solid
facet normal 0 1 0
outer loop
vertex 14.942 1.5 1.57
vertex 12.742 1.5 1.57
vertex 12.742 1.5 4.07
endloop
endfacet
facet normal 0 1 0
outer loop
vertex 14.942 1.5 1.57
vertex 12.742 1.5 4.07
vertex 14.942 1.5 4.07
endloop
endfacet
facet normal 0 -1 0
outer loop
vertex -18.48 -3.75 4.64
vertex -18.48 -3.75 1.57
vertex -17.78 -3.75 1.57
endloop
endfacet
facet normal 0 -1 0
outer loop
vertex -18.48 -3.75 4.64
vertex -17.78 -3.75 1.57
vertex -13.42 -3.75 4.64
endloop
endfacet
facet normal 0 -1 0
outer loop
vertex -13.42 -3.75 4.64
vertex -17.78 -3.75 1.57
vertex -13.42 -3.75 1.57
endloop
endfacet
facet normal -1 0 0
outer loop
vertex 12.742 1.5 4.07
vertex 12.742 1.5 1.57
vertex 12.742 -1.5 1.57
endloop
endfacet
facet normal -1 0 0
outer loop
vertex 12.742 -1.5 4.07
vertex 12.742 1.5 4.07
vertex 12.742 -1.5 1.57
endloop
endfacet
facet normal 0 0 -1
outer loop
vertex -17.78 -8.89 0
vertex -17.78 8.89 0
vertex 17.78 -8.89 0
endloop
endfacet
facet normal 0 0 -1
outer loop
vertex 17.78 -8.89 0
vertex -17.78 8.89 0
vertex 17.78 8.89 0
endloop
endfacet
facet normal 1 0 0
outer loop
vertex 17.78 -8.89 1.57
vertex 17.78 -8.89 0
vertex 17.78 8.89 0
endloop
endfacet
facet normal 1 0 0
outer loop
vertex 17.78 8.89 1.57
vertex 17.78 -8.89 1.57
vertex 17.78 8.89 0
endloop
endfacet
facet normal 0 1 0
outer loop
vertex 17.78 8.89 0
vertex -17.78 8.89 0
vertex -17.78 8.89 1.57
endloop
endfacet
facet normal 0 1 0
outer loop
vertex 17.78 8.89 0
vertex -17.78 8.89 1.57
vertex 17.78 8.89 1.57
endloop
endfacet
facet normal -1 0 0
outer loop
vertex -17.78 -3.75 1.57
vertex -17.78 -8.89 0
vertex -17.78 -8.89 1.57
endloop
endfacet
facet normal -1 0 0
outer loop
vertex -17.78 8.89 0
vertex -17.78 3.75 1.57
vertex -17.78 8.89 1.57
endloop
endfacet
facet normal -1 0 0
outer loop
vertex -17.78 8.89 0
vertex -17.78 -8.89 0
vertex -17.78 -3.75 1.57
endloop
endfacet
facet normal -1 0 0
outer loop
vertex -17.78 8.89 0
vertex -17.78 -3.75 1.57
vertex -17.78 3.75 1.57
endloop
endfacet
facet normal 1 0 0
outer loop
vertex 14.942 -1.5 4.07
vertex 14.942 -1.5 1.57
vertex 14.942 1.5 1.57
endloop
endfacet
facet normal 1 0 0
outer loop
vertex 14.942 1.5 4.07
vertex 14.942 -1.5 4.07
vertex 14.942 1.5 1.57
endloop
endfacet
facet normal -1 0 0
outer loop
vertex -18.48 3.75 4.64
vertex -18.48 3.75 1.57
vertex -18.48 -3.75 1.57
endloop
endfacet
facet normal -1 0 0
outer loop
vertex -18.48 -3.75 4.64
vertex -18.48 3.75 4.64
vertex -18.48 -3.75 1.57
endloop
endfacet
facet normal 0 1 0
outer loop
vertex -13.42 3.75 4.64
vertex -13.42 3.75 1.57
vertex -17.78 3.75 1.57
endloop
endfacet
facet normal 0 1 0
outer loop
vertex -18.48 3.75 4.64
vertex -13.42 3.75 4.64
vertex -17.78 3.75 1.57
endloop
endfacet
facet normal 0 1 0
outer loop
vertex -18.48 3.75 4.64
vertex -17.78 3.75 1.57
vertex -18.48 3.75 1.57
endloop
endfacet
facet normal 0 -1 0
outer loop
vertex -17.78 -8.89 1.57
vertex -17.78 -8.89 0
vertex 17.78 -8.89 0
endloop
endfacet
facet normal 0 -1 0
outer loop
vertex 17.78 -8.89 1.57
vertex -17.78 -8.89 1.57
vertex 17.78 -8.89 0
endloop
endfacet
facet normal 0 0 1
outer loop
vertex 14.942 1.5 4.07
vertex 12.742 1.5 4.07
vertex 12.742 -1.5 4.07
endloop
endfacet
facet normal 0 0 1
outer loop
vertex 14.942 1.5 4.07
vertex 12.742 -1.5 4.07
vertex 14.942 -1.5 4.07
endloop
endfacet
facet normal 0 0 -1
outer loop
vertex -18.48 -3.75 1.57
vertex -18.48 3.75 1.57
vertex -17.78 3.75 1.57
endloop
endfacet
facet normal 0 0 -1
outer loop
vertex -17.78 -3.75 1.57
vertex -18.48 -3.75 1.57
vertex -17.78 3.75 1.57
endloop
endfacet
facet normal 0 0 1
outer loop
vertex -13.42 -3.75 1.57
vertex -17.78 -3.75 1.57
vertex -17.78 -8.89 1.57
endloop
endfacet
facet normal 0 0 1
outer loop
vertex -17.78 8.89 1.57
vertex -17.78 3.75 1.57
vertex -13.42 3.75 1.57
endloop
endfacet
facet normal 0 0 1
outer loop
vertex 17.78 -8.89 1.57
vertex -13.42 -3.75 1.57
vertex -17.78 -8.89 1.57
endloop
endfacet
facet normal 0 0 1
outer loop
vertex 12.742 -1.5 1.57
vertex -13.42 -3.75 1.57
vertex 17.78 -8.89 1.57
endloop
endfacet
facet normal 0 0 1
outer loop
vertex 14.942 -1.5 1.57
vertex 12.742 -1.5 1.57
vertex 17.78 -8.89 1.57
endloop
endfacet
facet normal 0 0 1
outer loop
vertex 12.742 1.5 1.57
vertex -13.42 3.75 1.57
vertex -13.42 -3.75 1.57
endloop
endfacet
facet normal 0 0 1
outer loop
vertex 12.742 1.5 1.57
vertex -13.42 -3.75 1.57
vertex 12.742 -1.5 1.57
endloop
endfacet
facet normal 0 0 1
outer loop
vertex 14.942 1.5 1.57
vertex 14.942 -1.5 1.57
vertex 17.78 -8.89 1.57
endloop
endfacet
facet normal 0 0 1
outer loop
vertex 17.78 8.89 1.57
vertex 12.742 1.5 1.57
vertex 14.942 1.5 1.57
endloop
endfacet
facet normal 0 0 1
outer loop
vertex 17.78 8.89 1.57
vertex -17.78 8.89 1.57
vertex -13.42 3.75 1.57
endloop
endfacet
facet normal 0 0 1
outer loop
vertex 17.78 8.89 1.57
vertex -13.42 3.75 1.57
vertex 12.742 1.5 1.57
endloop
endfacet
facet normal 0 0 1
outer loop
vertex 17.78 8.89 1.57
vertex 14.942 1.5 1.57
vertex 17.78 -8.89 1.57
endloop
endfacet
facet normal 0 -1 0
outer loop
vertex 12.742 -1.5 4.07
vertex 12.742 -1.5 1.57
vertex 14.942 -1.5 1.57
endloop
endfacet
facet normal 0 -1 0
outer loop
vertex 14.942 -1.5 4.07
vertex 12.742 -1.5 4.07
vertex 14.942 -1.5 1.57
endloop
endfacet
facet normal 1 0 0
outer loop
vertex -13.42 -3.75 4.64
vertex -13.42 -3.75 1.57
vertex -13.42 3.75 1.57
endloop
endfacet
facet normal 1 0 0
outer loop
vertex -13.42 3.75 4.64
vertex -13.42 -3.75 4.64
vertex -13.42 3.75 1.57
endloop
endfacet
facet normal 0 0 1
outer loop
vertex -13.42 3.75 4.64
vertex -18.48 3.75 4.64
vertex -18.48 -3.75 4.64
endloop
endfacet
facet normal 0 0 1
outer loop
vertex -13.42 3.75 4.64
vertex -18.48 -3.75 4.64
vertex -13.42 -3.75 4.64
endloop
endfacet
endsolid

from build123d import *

# Parameters (mm, degrees)
F0_W     = 35.56
F0_H     = 17.78
F1_DEPTH = 1.57
F2_W     = 4.36
F2_H     = 3.75
F3_DEPTH = 3.07
F2_W_2   = 2.2
F2_H_2   = 1.5
F4_DEPTH = 2.5


with BuildPart() as f1:
    # F0 (on Top) → F1 (new body)
    with BuildSketch(Plane.XY):
        Rectangle(F0_W, F0_H)
    extrude(amount=F1_DEPTH)

    # F2 (on face) → F3 (join)
    with BuildSketch(Plane.XY.offset(1.57)):
        with Locations((-15.6, 1.875)):
            Rectangle(F2_W, F2_H)
        Polygon((-17.78, -3.75), (-17.78, 0), (-17.78, 3.75), (-18.48, 3.75), (-18.48, -3.75), align=None)
        with Locations((-15.6, -1.875)):
            Rectangle(F2_W, F2_H)
    extrude(amount=F3_DEPTH)

    # F2 (on face) → F4 (join)
    with BuildSketch(Plane.XY.offset(1.57)):
        with Locations((13.841648, 0.75)):
            Rectangle(F2_W_2, F2_H_2)
        with Locations((13.841648, -0.75)):
            Rectangle(F2_W_2, F2_H_2)
    extrude(amount=F4_DEPTH)


solid = f1.part
